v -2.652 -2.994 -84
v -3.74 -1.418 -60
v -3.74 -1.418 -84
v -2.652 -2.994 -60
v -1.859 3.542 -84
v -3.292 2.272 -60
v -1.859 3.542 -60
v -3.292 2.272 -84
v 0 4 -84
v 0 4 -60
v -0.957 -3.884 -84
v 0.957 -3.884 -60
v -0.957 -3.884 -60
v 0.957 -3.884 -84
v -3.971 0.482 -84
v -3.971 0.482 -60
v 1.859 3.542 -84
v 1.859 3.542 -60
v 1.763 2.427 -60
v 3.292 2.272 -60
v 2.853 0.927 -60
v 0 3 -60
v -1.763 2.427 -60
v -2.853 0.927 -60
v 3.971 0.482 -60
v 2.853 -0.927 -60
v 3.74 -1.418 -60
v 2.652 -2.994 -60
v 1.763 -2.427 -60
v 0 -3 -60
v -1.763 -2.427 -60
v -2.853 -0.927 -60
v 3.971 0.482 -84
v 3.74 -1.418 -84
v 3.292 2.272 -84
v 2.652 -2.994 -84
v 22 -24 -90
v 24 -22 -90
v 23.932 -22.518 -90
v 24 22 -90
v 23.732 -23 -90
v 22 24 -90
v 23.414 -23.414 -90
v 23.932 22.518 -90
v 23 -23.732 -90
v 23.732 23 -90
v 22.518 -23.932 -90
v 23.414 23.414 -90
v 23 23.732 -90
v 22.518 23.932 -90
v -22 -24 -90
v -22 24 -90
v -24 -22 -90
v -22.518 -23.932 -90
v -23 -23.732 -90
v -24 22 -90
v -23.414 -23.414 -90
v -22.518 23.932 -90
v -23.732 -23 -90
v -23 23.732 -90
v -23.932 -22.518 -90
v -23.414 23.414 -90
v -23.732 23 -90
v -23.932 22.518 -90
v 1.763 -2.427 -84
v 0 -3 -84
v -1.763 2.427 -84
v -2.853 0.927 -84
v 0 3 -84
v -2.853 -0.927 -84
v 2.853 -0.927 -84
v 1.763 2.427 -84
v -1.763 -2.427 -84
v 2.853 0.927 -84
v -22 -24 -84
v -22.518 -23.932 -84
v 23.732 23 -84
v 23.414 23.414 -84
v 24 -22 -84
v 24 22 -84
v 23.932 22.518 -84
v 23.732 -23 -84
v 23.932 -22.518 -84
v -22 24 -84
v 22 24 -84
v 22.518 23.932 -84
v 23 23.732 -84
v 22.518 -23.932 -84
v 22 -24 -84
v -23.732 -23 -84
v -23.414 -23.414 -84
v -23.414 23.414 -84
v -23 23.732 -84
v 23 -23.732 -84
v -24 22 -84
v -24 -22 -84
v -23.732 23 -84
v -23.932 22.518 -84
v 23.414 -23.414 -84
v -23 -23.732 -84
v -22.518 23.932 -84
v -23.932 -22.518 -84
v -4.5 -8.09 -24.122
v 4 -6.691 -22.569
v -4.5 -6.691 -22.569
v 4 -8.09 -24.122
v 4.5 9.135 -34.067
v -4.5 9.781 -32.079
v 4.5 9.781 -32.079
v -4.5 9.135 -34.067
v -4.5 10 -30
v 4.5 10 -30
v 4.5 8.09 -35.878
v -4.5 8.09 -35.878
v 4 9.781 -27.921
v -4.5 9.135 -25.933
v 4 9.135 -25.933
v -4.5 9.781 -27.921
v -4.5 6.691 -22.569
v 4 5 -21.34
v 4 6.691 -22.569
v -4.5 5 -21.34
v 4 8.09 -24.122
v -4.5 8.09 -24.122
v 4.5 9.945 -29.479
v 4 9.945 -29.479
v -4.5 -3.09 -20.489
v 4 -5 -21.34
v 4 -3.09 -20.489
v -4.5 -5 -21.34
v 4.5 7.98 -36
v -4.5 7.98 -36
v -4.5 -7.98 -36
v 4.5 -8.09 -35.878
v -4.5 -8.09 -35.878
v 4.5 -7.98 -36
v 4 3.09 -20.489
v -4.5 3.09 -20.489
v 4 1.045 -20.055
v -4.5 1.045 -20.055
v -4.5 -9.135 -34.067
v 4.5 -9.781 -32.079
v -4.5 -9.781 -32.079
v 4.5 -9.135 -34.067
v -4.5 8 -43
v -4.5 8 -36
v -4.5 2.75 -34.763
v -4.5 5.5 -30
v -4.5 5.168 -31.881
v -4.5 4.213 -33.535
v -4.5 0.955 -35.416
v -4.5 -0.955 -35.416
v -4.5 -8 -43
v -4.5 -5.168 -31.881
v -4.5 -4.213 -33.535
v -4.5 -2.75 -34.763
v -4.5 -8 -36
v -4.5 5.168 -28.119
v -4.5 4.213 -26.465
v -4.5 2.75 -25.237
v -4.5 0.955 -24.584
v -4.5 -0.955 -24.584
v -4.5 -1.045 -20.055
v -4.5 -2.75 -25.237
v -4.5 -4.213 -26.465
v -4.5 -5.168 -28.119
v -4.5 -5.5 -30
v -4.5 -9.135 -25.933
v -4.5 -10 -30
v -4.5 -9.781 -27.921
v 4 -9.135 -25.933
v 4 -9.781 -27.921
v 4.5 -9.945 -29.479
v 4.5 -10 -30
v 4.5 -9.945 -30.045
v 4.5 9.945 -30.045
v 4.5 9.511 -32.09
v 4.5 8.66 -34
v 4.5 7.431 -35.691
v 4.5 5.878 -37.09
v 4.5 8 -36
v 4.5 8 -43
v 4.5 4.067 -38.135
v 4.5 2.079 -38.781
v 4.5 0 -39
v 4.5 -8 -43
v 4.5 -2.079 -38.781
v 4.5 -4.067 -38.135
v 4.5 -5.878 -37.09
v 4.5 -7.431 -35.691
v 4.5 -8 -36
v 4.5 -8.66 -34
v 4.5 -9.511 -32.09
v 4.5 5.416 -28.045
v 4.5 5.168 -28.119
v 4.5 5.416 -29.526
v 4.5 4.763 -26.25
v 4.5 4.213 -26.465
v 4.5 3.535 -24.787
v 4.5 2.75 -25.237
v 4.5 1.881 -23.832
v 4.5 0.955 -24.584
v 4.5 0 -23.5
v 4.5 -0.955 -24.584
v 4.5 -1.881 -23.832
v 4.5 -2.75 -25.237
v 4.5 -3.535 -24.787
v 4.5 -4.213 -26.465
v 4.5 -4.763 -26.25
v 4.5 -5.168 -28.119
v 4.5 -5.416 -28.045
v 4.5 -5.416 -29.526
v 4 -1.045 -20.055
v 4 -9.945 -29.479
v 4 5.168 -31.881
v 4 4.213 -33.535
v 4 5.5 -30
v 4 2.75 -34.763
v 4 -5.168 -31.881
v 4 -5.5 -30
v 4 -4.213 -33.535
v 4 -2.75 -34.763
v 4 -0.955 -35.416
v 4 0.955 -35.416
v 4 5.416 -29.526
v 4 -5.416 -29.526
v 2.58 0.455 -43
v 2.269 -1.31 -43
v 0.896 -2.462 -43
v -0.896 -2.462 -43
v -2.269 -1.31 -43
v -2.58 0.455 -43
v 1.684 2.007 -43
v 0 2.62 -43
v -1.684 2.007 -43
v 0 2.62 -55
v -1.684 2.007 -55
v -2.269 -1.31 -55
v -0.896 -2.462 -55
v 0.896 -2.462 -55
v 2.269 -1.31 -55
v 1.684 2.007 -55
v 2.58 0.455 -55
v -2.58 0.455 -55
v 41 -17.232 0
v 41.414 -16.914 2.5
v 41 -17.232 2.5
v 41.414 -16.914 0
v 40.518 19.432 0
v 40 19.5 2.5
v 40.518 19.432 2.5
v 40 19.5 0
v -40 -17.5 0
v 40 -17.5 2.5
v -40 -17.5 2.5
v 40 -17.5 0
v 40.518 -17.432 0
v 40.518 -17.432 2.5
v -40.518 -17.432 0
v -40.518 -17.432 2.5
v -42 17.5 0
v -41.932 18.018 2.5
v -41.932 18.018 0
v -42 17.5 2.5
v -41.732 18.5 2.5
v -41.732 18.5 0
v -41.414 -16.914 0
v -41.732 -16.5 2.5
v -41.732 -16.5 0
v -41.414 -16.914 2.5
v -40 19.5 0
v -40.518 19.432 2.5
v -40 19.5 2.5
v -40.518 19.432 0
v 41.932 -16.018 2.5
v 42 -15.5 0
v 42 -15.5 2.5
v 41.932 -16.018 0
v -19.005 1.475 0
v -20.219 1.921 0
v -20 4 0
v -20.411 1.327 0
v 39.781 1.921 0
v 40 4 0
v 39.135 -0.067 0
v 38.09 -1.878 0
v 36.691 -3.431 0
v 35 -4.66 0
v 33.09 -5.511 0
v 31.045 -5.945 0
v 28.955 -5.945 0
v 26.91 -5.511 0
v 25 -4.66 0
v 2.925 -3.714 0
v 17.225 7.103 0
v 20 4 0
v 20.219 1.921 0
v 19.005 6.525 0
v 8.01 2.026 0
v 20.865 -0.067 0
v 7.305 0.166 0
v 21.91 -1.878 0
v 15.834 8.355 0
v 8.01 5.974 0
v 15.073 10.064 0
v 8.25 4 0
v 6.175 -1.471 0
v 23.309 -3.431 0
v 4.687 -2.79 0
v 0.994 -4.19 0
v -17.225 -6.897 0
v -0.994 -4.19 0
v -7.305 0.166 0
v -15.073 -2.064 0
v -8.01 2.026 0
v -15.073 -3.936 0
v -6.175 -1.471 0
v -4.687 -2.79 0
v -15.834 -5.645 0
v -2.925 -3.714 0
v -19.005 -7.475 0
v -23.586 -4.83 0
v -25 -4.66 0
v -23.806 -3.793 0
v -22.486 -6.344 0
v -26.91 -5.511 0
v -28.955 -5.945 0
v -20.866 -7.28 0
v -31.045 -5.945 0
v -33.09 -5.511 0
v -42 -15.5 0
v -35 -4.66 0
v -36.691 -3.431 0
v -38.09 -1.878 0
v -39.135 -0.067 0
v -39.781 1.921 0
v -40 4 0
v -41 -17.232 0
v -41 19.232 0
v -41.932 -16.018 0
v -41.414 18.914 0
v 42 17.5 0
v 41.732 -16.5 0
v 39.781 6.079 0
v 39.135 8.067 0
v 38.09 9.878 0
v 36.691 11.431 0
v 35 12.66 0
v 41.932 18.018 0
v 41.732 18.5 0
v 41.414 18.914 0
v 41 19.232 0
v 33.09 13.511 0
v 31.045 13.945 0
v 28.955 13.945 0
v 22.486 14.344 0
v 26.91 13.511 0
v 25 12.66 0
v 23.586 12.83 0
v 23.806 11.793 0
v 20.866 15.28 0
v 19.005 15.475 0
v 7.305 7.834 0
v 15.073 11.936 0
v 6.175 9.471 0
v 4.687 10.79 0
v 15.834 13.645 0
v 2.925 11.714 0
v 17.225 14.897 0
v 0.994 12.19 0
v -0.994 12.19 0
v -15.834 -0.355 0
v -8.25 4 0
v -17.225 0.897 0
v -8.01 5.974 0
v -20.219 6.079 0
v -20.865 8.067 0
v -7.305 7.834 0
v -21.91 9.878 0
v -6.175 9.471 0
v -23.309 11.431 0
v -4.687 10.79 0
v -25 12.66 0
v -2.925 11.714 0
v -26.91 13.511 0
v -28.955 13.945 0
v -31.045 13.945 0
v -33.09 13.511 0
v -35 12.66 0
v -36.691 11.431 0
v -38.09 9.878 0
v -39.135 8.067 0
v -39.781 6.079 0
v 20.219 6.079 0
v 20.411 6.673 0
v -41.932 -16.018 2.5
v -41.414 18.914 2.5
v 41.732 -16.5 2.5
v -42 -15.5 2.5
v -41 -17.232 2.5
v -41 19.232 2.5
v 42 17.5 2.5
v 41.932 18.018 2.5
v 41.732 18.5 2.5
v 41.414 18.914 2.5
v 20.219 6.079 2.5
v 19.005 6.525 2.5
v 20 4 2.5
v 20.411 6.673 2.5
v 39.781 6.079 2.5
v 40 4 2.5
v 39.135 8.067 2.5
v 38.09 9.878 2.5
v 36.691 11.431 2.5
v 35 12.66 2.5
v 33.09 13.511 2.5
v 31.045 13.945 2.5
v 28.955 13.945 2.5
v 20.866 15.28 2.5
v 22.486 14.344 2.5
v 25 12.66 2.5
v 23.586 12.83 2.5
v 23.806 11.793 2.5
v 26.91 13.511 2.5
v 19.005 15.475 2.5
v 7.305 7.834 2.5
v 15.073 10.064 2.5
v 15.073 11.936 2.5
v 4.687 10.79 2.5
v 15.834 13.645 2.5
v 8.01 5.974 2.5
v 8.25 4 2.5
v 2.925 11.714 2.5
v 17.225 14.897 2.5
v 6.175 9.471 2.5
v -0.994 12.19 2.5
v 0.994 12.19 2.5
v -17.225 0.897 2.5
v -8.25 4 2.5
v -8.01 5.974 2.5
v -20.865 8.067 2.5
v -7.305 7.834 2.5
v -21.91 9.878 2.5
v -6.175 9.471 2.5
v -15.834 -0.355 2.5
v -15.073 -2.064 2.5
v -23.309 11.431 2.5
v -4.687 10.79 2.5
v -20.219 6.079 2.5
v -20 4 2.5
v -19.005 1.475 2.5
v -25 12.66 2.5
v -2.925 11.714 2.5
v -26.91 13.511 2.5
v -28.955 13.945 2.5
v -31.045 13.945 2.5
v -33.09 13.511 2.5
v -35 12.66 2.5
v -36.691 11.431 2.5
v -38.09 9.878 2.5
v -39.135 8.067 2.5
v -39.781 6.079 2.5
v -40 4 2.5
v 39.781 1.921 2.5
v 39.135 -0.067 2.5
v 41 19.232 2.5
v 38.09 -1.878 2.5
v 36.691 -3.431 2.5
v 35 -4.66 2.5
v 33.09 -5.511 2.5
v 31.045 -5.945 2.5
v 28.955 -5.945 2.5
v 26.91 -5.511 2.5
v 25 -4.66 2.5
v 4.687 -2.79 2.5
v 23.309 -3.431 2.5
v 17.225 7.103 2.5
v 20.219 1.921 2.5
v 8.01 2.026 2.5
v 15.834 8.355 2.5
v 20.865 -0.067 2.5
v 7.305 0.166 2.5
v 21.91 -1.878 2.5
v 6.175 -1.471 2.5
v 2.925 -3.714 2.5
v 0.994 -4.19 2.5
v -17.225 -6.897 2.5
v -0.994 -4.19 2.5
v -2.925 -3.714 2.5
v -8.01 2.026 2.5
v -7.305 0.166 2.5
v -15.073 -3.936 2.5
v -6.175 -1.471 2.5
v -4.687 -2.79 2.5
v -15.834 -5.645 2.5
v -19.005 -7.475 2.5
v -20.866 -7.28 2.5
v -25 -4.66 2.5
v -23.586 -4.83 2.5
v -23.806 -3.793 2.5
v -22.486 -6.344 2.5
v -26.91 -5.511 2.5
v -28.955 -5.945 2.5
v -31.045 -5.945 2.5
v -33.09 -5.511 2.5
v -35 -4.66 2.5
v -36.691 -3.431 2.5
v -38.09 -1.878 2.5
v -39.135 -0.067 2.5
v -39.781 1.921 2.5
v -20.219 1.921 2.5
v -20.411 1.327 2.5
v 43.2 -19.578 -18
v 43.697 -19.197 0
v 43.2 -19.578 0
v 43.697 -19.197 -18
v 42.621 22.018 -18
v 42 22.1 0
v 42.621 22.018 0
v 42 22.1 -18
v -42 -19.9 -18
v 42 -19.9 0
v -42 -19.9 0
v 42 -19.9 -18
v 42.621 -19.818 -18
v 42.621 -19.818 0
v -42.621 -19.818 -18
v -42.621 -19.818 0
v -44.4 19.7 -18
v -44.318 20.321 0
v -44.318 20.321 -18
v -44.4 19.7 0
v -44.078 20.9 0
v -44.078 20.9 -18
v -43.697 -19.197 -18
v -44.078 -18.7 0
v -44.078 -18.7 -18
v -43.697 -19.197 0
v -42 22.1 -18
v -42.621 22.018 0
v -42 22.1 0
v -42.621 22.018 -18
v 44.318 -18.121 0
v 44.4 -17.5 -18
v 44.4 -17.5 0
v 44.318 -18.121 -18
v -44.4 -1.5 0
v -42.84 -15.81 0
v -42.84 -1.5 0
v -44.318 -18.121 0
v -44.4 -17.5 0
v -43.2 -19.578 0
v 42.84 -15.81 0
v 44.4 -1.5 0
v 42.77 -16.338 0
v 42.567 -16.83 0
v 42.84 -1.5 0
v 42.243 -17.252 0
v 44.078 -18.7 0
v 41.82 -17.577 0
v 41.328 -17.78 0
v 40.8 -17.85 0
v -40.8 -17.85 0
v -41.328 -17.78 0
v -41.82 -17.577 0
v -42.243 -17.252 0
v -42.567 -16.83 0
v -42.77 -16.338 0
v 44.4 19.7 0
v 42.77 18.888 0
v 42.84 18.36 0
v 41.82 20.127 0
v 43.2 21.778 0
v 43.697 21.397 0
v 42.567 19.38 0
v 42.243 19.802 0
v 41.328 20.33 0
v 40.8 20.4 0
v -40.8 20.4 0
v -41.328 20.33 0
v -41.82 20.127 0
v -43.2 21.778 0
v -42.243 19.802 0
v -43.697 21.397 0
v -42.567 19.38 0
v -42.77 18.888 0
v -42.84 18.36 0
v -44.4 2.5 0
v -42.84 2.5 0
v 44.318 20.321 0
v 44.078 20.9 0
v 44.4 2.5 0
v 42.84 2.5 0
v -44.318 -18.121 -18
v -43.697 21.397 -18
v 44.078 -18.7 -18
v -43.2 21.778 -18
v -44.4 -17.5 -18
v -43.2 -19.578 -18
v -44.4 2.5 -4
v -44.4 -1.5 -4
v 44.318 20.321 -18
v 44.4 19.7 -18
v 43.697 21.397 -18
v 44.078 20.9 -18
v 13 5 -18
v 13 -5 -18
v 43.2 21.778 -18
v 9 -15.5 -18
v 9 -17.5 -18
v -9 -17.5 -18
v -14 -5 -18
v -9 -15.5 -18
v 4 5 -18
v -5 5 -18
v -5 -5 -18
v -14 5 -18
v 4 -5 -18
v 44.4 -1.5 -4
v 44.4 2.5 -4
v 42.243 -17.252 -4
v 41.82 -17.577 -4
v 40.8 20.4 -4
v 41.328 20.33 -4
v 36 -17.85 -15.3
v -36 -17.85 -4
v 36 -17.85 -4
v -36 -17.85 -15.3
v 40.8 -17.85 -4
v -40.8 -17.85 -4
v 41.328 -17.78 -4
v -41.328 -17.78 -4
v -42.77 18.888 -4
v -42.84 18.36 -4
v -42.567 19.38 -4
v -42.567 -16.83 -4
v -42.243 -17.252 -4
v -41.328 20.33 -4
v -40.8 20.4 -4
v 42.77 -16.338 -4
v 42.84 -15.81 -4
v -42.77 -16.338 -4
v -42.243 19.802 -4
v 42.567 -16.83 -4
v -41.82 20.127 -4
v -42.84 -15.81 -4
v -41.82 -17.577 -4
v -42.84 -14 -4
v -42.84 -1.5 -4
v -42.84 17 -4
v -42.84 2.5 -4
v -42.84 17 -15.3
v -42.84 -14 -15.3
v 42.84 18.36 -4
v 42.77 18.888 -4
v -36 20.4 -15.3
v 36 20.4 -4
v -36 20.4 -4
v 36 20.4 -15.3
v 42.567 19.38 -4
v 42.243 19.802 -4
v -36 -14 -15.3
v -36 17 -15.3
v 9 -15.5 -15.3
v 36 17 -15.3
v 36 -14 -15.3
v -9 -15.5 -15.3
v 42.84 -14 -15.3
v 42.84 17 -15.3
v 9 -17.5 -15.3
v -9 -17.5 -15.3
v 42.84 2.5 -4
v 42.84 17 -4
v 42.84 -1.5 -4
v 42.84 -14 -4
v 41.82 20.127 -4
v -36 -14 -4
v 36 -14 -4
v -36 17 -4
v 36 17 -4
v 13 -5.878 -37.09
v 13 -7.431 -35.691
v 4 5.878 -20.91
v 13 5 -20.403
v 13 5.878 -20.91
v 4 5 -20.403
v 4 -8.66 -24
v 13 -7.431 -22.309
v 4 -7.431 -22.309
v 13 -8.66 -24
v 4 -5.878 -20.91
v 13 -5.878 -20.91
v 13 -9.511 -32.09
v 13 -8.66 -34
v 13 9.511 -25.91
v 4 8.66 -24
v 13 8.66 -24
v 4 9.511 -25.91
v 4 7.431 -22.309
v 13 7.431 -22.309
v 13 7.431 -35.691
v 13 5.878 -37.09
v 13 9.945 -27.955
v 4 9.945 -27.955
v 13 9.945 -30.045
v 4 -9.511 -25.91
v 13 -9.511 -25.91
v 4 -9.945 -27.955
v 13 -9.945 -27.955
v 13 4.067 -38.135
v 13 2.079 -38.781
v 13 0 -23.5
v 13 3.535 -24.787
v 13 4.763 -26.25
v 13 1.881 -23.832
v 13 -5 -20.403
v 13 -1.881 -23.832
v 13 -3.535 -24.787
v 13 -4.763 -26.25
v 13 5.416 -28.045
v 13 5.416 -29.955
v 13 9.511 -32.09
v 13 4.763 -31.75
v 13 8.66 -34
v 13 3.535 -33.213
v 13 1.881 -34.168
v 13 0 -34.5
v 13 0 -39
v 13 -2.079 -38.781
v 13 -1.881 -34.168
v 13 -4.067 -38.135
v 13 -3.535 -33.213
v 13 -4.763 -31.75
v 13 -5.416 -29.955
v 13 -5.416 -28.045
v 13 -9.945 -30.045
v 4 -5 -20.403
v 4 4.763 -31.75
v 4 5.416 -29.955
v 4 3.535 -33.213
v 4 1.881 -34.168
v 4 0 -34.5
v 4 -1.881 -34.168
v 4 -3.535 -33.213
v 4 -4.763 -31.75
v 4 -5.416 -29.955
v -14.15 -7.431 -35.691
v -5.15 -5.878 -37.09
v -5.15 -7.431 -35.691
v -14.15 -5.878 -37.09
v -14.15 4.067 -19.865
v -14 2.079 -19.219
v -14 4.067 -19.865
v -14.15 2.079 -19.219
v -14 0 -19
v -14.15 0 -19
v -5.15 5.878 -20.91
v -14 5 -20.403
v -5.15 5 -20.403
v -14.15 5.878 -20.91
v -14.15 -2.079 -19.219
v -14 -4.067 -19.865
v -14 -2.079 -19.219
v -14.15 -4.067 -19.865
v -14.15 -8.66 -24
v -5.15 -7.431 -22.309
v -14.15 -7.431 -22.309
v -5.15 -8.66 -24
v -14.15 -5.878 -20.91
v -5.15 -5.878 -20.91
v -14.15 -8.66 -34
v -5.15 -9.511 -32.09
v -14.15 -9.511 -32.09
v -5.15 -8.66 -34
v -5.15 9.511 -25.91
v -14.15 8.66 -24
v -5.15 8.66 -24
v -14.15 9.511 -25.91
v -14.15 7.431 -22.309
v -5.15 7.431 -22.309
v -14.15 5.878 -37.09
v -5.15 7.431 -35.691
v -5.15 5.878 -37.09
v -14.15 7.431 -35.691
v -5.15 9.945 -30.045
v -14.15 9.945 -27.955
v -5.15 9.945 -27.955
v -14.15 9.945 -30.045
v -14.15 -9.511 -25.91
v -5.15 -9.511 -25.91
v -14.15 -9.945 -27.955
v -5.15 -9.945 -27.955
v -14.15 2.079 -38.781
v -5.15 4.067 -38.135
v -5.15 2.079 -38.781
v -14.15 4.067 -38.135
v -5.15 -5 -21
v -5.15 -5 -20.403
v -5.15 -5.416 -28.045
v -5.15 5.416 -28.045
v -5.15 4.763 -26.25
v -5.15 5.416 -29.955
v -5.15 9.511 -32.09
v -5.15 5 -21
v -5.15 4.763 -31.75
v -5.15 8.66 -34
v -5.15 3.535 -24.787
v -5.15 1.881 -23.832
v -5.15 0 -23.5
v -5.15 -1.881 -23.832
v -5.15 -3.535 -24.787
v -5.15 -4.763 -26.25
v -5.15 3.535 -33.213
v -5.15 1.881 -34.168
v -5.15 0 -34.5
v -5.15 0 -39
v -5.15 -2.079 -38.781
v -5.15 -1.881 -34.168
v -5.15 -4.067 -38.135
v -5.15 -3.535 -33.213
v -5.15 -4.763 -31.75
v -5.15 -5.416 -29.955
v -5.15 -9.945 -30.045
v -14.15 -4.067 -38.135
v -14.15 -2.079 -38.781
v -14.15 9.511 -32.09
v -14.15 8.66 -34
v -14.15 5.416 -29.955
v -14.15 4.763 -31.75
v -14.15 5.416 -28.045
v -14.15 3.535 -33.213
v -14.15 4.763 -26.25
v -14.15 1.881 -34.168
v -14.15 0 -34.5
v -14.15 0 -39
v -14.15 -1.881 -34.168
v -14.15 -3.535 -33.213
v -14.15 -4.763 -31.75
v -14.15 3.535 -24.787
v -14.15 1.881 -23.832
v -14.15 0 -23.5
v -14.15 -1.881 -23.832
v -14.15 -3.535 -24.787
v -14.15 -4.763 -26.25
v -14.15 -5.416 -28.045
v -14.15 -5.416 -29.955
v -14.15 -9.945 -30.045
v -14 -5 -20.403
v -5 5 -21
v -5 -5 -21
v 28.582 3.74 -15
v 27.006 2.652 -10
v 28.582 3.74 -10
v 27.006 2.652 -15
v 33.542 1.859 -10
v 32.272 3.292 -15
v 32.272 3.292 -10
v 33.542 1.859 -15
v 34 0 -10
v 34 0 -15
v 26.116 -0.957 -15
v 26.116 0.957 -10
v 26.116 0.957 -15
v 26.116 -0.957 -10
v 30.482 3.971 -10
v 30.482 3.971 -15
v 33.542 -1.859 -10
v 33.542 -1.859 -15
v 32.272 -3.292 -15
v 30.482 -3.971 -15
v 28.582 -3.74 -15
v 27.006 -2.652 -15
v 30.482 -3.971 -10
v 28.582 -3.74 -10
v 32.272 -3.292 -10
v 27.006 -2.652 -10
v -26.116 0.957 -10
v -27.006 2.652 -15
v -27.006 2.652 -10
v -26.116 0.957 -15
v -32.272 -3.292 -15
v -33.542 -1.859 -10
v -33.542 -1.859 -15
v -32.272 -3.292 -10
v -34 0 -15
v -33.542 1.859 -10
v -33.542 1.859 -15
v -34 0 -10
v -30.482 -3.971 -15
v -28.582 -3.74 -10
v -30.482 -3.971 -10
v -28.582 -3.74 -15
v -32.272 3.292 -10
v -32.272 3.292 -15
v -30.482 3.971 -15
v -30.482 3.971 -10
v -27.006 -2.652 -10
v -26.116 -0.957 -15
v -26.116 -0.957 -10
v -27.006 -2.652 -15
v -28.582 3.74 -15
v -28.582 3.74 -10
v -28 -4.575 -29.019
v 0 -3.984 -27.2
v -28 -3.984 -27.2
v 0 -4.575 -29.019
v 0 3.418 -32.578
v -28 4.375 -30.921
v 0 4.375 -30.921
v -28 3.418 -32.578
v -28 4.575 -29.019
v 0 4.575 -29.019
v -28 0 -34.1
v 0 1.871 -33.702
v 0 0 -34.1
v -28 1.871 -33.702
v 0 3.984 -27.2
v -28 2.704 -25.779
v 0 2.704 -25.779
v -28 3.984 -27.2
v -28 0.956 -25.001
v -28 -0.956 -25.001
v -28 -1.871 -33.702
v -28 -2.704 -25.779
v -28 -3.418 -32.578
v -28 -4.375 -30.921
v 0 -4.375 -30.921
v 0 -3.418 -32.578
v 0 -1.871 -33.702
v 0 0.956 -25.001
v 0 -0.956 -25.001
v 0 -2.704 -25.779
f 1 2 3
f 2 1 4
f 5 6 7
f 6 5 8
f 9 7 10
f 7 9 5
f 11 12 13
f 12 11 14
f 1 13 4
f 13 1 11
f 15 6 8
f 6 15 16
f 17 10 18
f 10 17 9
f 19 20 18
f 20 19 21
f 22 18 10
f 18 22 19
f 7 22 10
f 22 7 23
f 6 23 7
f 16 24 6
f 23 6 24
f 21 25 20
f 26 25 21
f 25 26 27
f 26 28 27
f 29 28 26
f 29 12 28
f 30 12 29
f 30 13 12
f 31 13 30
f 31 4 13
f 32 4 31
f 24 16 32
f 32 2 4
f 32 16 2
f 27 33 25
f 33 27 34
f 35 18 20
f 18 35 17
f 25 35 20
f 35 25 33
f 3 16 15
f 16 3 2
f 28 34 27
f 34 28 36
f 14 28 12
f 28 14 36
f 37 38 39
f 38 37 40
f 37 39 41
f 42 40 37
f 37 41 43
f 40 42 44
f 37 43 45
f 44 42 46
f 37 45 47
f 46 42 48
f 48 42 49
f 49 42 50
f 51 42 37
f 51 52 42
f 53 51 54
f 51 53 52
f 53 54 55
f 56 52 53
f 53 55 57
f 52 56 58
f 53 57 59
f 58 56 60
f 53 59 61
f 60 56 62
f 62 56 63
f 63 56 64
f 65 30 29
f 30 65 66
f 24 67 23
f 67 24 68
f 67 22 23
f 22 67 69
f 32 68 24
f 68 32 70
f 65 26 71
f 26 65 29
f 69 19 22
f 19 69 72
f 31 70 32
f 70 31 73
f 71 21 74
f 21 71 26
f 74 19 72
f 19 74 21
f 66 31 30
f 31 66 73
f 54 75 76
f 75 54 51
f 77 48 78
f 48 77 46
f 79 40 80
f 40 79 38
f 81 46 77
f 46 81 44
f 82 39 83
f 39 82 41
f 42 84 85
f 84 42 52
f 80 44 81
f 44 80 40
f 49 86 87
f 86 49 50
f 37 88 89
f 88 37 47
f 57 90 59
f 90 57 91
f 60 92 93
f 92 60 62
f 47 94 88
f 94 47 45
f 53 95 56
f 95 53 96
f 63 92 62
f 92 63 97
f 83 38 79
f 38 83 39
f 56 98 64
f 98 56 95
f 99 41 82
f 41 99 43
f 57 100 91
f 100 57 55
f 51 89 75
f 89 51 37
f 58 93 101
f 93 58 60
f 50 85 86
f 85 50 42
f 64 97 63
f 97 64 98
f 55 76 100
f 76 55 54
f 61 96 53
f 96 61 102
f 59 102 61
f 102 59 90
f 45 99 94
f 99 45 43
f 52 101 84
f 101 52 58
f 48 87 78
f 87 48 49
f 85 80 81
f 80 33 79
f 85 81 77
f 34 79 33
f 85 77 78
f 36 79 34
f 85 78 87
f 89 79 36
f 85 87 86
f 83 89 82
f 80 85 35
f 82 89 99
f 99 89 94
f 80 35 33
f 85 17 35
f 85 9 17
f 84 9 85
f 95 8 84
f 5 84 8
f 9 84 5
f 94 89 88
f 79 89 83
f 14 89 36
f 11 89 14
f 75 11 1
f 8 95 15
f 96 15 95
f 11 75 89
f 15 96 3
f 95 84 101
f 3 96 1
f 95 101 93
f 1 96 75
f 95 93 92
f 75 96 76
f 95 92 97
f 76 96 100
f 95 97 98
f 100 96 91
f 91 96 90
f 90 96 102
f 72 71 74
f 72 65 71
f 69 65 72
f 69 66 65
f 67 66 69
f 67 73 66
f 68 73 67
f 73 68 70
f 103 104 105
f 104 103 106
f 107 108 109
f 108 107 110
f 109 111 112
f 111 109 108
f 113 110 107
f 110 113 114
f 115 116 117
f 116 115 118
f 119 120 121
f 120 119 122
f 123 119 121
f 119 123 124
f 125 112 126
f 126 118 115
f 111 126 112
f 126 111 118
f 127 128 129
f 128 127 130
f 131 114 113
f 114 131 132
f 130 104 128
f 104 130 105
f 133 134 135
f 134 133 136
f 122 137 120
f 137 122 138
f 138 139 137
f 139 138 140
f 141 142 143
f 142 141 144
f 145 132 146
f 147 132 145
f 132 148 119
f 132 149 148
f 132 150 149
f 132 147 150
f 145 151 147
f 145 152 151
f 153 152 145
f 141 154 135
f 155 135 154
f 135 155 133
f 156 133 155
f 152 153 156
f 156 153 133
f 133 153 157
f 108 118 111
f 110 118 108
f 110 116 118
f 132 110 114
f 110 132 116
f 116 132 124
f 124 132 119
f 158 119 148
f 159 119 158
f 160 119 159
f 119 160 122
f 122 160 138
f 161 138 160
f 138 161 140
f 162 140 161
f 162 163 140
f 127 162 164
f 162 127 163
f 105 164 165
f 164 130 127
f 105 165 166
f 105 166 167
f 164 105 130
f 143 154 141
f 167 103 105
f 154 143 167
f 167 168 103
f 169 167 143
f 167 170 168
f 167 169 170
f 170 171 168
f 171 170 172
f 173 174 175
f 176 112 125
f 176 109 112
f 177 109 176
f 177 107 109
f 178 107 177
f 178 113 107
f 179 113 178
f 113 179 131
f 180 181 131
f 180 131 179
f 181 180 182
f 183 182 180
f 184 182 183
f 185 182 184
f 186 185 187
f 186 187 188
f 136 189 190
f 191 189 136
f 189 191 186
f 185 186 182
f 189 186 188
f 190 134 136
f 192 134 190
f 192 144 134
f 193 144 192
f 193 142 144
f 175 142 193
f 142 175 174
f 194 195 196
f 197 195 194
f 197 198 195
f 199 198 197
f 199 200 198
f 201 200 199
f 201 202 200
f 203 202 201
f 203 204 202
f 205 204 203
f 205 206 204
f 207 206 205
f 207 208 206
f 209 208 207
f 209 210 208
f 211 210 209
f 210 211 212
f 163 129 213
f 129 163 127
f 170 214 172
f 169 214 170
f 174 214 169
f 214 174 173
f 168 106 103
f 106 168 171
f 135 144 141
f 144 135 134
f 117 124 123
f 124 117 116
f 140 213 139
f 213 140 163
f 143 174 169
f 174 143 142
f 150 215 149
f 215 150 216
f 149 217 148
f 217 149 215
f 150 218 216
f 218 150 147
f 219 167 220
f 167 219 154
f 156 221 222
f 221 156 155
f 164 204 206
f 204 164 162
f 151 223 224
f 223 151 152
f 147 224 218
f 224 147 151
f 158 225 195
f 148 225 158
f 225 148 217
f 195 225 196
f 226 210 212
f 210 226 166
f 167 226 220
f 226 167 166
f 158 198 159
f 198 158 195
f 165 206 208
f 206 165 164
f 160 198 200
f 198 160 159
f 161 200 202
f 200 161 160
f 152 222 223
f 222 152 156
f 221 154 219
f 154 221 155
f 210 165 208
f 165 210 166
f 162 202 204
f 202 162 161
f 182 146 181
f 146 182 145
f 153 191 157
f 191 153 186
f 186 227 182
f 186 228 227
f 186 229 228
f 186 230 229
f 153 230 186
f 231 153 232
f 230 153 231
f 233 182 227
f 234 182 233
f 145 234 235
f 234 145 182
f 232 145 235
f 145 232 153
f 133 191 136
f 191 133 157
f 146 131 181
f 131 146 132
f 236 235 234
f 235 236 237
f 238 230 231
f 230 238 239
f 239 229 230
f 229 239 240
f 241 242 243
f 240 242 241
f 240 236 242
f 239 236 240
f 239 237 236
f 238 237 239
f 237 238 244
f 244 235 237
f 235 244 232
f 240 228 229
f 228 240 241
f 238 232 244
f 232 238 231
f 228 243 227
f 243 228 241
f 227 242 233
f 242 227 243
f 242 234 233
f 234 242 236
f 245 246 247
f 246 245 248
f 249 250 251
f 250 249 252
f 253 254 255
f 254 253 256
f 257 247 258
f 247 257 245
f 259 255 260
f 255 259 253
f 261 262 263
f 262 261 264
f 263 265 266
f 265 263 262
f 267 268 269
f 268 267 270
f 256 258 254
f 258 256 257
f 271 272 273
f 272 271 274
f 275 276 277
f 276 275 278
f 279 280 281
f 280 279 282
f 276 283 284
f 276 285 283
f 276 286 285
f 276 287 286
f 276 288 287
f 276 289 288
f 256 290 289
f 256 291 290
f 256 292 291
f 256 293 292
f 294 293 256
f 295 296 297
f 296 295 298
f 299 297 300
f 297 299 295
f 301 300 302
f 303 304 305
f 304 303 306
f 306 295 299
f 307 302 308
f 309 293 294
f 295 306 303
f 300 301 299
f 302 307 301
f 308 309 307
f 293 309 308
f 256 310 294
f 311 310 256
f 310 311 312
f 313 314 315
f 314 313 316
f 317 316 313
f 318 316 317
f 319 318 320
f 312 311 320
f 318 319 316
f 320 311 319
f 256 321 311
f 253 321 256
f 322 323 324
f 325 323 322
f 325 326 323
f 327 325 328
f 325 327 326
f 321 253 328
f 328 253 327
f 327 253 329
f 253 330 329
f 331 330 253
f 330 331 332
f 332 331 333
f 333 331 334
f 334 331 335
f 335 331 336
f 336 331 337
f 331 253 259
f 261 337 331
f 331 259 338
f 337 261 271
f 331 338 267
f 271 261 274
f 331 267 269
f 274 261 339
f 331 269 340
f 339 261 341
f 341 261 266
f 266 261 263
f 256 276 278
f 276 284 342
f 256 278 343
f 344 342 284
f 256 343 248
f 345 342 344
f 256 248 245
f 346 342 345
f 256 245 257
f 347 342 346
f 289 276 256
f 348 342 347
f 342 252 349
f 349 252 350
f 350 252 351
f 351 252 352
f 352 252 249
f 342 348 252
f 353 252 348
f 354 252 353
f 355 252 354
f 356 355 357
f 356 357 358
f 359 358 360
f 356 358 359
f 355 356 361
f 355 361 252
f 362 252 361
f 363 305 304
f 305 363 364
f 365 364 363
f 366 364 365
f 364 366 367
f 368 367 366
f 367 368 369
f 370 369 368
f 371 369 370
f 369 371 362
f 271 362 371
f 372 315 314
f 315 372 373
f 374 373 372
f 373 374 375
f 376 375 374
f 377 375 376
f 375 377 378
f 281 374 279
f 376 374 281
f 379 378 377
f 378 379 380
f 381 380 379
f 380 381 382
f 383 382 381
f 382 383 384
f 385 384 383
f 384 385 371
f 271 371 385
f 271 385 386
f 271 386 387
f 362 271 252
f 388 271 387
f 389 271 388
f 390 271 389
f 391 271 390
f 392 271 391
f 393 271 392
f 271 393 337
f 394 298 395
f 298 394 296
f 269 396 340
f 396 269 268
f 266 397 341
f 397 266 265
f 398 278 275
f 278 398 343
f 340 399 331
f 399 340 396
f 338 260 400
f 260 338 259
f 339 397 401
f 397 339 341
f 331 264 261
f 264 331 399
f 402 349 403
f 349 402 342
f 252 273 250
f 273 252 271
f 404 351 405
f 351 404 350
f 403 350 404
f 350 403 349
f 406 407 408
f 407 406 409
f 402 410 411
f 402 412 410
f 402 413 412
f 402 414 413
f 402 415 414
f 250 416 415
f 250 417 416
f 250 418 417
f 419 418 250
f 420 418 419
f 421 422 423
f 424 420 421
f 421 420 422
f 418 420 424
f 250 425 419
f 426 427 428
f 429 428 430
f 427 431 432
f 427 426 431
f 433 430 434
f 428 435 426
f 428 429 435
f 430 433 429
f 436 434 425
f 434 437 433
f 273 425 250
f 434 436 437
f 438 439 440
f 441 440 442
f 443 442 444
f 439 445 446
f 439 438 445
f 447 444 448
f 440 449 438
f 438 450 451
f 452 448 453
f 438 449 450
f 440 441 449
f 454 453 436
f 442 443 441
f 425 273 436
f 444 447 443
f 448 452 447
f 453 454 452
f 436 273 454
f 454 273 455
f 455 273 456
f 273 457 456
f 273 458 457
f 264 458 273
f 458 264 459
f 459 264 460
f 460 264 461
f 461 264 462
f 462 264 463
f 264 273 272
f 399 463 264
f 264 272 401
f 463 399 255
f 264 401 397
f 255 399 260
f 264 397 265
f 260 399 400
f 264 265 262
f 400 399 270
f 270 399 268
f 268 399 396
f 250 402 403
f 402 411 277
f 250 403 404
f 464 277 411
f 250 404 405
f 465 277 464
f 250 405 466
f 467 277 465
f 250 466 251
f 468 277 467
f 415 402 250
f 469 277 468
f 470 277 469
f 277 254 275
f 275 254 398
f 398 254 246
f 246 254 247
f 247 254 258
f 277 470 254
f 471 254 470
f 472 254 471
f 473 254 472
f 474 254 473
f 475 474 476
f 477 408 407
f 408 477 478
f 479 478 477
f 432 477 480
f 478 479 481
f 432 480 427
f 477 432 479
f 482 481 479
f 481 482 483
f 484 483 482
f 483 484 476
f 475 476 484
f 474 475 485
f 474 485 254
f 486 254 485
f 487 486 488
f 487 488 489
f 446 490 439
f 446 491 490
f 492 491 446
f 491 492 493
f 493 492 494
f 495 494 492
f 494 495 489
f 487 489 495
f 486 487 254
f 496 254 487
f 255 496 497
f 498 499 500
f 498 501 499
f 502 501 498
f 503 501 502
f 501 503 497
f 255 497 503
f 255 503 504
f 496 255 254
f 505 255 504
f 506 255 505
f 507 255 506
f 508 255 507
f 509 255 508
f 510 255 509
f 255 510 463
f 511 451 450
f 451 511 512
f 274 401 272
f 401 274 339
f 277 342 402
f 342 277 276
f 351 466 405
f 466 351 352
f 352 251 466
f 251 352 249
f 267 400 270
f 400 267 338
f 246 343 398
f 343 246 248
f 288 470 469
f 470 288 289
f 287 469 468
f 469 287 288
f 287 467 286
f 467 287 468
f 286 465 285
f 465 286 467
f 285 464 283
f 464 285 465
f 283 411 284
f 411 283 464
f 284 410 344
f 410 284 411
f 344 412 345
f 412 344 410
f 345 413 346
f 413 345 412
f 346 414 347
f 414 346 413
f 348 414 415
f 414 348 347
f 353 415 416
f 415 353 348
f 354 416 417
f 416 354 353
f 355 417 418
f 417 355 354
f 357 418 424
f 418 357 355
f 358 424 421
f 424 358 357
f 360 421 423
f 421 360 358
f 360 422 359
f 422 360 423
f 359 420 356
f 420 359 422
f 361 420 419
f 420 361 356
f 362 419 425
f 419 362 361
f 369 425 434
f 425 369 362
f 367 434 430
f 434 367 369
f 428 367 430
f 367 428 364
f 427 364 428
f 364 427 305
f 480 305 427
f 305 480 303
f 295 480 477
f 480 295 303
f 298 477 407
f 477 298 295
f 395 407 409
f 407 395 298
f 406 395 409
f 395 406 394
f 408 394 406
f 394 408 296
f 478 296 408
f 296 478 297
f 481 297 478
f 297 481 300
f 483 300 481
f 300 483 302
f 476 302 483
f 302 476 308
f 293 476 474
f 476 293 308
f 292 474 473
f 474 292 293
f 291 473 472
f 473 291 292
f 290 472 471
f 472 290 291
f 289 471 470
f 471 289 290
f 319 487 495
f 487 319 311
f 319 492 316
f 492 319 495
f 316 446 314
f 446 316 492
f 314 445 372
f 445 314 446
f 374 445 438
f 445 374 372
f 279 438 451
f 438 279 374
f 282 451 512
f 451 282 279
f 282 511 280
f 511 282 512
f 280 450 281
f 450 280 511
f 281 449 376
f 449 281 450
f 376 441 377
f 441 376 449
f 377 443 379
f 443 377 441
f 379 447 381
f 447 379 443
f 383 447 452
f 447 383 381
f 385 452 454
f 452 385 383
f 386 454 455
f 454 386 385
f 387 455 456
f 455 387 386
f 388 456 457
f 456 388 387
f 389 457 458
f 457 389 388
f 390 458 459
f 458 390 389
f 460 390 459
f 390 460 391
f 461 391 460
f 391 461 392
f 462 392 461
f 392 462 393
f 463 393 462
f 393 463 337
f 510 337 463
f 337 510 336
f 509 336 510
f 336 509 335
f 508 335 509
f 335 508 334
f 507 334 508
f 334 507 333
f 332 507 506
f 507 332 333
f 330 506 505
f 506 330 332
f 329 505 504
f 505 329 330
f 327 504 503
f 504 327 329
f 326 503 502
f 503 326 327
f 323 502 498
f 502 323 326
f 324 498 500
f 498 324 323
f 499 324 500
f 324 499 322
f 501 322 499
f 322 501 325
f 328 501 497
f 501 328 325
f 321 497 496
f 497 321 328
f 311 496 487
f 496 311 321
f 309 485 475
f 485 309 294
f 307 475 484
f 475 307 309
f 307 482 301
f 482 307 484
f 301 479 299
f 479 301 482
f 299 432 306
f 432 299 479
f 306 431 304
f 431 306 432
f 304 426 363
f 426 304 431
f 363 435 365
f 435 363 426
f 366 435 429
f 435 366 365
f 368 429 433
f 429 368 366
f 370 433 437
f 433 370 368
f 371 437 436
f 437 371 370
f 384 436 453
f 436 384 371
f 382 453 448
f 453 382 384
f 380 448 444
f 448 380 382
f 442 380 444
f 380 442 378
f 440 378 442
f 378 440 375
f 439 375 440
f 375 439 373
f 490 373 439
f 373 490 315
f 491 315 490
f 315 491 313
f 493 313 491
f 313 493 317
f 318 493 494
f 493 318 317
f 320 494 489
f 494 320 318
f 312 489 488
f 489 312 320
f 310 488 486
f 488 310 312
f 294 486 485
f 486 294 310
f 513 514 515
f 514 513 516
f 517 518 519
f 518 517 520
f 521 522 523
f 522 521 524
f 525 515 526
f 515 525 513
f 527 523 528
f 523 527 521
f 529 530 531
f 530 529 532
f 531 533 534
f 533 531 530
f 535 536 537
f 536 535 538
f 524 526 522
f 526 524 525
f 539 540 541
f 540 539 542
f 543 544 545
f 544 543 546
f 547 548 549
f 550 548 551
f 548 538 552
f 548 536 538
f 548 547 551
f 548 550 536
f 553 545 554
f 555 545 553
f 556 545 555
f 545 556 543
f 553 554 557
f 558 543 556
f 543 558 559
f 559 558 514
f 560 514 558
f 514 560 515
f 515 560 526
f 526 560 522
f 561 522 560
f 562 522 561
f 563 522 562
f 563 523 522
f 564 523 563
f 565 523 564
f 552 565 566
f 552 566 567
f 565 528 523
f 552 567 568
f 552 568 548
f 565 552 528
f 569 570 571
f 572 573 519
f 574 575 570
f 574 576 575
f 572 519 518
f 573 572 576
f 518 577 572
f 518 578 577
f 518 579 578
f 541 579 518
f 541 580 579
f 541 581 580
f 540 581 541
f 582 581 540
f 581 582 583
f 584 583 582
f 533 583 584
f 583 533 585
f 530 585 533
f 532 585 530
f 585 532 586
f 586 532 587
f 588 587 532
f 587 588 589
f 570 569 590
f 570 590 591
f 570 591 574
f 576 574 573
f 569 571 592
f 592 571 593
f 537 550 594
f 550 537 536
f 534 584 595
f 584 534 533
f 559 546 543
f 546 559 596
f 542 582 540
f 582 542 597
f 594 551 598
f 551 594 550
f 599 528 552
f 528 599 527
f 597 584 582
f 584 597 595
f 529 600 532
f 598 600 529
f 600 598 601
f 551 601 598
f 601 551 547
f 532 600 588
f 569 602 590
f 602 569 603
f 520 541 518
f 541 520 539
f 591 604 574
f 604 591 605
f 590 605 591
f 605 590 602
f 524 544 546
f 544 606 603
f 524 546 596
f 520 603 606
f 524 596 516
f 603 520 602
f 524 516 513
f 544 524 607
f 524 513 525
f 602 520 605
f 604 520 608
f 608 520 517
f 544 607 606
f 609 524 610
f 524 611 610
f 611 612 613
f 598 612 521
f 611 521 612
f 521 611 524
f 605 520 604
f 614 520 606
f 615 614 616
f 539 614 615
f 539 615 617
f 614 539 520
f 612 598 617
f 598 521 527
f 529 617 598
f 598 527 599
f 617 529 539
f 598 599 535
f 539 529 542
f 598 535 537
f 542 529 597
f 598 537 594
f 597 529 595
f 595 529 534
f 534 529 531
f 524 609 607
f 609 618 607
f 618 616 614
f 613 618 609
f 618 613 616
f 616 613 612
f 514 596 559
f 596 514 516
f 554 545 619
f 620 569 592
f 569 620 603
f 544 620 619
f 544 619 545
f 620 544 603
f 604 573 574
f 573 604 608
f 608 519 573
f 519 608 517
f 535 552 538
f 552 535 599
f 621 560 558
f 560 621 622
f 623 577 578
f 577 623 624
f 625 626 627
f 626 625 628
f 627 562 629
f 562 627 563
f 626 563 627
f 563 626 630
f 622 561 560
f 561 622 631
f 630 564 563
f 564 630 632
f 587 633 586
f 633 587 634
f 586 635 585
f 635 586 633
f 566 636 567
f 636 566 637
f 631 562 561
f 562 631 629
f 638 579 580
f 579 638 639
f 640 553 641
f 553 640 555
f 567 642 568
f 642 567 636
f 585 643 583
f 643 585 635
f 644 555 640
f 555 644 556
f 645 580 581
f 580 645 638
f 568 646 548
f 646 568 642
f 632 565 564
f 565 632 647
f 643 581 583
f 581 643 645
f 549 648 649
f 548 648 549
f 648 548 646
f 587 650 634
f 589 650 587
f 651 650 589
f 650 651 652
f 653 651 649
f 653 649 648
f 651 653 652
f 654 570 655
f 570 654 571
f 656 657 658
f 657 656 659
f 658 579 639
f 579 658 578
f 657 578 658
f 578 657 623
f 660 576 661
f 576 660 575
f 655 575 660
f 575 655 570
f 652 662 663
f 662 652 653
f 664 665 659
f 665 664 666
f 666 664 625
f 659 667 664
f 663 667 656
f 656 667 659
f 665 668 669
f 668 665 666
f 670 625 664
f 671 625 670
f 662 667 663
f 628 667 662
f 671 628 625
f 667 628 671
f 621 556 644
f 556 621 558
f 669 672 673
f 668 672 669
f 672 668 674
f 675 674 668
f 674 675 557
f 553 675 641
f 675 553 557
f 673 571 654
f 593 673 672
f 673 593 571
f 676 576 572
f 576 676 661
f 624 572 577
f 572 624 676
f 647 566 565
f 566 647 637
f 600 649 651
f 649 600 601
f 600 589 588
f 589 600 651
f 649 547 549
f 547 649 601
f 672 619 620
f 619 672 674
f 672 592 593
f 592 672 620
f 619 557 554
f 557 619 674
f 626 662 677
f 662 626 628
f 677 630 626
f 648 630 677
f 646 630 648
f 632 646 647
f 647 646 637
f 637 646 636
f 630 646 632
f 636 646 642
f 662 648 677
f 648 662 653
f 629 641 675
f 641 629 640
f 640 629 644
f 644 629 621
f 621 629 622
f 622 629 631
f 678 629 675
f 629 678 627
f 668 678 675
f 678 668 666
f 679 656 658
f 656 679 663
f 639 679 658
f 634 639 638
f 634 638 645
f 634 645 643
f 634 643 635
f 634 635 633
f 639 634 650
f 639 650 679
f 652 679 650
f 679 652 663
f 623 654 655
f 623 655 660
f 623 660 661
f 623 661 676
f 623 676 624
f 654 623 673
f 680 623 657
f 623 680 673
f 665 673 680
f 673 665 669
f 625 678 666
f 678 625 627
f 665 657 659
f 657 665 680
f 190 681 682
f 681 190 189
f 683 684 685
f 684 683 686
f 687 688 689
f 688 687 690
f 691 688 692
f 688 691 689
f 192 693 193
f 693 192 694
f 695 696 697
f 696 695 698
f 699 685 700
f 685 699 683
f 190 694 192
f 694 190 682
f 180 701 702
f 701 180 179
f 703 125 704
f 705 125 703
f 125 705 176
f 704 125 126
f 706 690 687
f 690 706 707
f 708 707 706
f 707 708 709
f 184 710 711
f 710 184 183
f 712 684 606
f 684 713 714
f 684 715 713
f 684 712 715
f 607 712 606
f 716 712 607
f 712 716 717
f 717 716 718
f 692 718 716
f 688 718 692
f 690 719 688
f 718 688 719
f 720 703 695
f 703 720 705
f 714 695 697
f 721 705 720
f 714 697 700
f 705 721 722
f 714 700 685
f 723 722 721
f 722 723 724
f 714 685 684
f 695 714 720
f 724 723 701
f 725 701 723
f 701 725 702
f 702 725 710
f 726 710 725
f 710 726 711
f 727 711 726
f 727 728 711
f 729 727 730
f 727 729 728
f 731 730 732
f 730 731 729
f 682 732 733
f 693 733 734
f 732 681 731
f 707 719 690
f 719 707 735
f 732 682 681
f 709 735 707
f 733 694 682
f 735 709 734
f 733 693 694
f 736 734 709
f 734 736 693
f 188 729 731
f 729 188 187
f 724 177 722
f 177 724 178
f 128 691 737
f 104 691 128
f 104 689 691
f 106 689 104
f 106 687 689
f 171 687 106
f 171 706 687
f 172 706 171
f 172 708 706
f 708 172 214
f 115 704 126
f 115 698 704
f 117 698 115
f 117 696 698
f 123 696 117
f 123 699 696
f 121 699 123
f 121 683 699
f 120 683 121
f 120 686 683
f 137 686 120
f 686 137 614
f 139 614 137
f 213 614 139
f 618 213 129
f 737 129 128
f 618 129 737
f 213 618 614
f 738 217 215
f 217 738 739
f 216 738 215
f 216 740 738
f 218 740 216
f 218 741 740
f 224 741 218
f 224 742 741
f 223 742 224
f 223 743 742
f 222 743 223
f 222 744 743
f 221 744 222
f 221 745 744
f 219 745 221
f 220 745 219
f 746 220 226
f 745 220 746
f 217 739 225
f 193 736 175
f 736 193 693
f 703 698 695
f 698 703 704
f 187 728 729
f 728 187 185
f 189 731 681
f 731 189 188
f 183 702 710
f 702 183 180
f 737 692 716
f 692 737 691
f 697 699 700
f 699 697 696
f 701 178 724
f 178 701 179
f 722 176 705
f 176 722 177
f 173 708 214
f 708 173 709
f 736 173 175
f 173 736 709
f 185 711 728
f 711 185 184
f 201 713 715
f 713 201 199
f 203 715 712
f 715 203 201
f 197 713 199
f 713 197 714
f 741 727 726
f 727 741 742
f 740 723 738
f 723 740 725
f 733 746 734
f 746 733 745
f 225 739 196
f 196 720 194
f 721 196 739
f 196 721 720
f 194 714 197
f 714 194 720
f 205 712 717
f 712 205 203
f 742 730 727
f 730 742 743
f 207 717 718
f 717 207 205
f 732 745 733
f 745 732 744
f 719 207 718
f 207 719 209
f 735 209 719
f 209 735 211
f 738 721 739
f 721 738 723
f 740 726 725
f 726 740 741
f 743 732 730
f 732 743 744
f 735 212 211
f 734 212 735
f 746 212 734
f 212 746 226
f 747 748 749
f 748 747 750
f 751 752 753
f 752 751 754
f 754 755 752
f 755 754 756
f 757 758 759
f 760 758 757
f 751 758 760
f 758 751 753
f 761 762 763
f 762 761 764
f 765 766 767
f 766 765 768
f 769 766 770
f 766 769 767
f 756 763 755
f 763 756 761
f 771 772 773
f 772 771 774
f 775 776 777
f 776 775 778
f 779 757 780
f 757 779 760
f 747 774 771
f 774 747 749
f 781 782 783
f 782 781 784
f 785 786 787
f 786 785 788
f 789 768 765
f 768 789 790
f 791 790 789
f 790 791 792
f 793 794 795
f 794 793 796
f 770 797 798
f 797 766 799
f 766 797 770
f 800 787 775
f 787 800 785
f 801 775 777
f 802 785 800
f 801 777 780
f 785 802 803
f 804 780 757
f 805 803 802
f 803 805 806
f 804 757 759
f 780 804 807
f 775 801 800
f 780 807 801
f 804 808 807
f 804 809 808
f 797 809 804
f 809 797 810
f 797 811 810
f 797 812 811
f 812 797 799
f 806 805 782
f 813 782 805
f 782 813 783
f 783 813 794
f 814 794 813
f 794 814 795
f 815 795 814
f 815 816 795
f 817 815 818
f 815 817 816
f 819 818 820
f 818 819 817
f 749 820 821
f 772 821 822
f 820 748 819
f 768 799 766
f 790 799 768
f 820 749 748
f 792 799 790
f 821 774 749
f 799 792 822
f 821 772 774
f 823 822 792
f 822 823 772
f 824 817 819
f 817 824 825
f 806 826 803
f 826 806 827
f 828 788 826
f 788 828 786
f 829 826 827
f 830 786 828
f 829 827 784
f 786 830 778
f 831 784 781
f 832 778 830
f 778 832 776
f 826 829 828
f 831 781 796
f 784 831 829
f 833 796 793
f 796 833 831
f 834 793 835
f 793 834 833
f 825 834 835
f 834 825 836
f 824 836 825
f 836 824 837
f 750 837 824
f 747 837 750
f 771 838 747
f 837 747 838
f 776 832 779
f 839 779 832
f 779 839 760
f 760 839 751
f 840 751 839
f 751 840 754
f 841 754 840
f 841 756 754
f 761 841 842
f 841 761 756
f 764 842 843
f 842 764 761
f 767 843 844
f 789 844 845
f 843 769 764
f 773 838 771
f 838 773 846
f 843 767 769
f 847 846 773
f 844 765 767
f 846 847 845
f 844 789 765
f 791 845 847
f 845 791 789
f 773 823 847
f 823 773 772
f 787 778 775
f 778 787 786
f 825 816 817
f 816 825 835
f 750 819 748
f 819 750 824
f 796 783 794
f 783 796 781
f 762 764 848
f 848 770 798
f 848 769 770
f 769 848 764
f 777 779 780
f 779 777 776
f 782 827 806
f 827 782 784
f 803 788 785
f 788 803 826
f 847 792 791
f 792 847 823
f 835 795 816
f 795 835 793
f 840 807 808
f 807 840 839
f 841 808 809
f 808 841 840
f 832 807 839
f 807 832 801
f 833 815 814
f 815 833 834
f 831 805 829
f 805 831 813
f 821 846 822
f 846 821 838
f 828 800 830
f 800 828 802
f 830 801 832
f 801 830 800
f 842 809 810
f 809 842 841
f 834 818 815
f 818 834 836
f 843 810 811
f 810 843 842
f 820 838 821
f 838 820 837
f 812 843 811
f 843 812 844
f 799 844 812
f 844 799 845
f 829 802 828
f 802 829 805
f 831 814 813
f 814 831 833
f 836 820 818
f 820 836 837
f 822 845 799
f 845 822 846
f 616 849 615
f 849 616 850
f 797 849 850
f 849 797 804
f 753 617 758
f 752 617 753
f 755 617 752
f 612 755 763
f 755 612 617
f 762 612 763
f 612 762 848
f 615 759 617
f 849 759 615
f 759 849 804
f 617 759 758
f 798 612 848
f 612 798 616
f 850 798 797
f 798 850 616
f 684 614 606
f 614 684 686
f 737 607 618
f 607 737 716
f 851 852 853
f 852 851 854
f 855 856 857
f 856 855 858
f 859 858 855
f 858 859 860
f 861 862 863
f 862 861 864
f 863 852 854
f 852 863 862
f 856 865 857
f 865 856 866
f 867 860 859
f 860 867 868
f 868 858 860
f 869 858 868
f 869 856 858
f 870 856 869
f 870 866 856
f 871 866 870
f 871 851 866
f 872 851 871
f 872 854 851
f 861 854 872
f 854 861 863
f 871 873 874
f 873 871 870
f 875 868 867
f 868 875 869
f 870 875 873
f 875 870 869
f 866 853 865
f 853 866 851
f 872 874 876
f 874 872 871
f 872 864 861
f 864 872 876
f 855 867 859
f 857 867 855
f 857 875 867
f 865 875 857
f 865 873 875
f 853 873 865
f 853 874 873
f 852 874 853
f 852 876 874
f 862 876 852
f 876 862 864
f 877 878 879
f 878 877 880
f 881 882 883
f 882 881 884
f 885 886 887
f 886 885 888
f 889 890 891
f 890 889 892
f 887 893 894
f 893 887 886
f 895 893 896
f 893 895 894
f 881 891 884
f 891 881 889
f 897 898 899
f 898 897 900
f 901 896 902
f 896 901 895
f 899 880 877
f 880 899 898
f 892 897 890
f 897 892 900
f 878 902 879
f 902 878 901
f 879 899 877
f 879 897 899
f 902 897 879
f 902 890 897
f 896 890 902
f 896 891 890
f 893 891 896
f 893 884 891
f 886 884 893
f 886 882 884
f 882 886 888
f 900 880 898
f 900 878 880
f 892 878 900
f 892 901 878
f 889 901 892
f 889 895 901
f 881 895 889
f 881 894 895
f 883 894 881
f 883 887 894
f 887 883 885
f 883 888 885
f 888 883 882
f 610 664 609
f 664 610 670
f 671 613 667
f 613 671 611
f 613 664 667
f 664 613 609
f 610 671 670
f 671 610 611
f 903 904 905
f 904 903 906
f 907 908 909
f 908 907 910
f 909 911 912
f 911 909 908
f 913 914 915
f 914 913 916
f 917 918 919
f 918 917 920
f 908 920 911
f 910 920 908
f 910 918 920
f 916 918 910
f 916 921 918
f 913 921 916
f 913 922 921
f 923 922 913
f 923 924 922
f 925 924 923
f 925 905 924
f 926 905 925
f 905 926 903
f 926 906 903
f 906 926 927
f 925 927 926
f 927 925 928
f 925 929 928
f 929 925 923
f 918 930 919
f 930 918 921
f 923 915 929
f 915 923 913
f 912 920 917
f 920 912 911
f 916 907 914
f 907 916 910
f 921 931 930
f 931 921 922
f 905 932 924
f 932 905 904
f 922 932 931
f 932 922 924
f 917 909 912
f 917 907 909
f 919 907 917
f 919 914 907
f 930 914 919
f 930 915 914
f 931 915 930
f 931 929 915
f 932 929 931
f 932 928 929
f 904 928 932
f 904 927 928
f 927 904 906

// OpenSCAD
/*
    Modeling the raspeberry pi night vision camera
    By dotnetmobile@gmail.com December 2019 
*/

camera_diameter = 16.5;

big_circle_diameter = 20;
small_circle_diameter = 9;

big_circle_x_pos = 30;
big_circle_y_pos = 0;

//small_circle_x_pos = big_circle_x_pos - big_circle_diameter / 2;
small_circle_x_pos = 20.5;
small_circle_y_pos = 10;

camera_x_pos = 0;
camera_y_pos = 0;

// back side
backside_width = 80;
//backside_height = 25;
backside_height = 31;
backside_offset_x = -backside_width/2;
backside_offset_y = -backside_height/2;
//backside_offset_z = -18;
backside_offset_z = 0;

map_cube_x = 34;
map_cube_y = 8;
map_cube_z = 9;

irColor = "green";
cameraColor = "green";

backside_extrude_height = 15;

foot_big_disc_r = 10;
foot_big_disc_h = 3;

screw_hole_r = 5.5;

pivot_cylinder_h = 28;

foot_z_offset = 0;
foot_rotation_join_z_offset = 60;

foot_column_axis_h = 30;

module rotation_cylinder()
{
    difference()
    {
        cylinder(r=foot_big_disc_r,3*foot_big_disc_h);
        // screw hole
        translate([0,0,-2])
        cylinder(r=screw_hole_r,h=12);
    }
}

module pivot_cylinder()
{
    cylinder(r=screw_hole_r-.9,h=pivot_cylinder_h);
}

module roundedRectangle(width, height)  
{
    offset(2,$fn=24)
    square([width, height], center=false);
}

module irSensors()
{
    union()
    {
        // big circles
        translate([big_circle_x_pos,big_circle_y_pos,0])
        color(irColor)
        circle(d=big_circle_diameter);
        
        // small circles
        translate([0.95*small_circle_x_pos, 0.7*small_circle_y_pos, 0]) 
        color(irColor)
        circle(d=small_circle_diameter);
    }
}

module camera()
{
    translate([camera_x_pos, camera_y_pos, 0]) 
    color(cameraColor)
    circle(d=camera_diameter);
}

module night_vision_camera()
{
    irSensors();
    mirror([0,1,0]) mirror([1,0,0]) irSensors();
    camera();
}

module front_side_SAV()
{   
    difference() 
    {
        linear_extrude(height=2)
        translate([backside_offset_x, backside_offset_y, 1]) 
        roundedRectangle(backside_width, backside_height);
        
        linear_extrude(height=8) 
        night_vision_camera();
    }
}

module front_side()
{   
    difference() 
    {
        linear_extrude(height=2.5)
        translate([backside_offset_x, backside_offset_y, 1]) 
        roundedRectangle(backside_width, backside_height+2);
        
        translate([0,4,0])
        linear_extrude(height=8) 
        night_vision_camera();
    }
}

module twin_pillars()
{
    translate([backside_offset_x,backside_offset_y-4,4])
    cube([4,4,13]);
    translate([-backside_offset_x,backside_offset_y-4,4])
    cube([4,4,13]);
}

module front_side_blockers()
{
    twin_pillars();
    mirror([0,1,0])
    twin_pillars();
}

module back_rotation()
{
    translate([13,0,backside_height-2])
    {
        mirror([1,0,1])
        {
            translate([0,0,6.05*foot_big_disc_h])
            rotation_cylinder();
            rotation_cylinder();
        }
        translate([-27,-5,-13])
        cube([9,10,5]);
        translate([-9,-5,-13])
        cube([9,10,5]);
    }
}

module front_side_easy_extractors()
{
    translate([backside_offset_x-6,backside_offset_y+14,backside_offset_z])
    cube([5,4,4]);
    translate([-backside_offset_x,backside_offset_y+14,backside_offset_z])
    cube([5,4,4]);
}

module back_side()
{
    difference()
    {
        difference()
        {   
            // outside     
            translate([backside_offset_x-2,backside_offset_y-2,0])
            scale(1.2)
            color("blue")
            linear_extrude(height=backside_extrude_height)
            roundedRectangle(backside_width-10, backside_height);

            // inside
            scale(1.02)
            color("green")
            linear_extrude(height=backside_extrude_height)
            translate([backside_offset_x, backside_offset_y, 0])
            roundedRectangle(backside_width, backside_height+2.5);
        }
        front_side_easy_extractors();
    }
    // internal pilars for stopping front-side when clipsing it
    translate([0,1.5,0])
    union()
    {
        front_side_blockers();
        mirror([1,0,0]) front_side_blockers();
    }
    union()
    back_rotation(); 
}

module single_support()
{
    translate([big_circle_x_pos,big_circle_y_pos,backside_extrude_height-5])
    cylinder(5,r=4);
}

module camera_back_side_blockers()
{
    single_support();
    mirror([1,0,0]) single_support();
}

module extern_map_cube()
{
    translate([-map_cube_x/2-4,backside_offset_y*1.95,backside_offset_z+1]) 
    {
        color("red")
        scale(1.2)
        cube([map_cube_x,map_cube_y,map_cube_z+2]);
    }
}

module intern_map_cube()
{
        translate([-map_cube_x/2 -4 + 3.5,backside_offset_y*2.7,backside_offset_z+3]) 
        {
            cube([map_cube_x,map_cube_y*2.5,map_cube_z*0.7+2]);
        }
}

module case()
{
    difference()
    {
        translate([0,0,backside_offset_z]) union()
        {
            back_side();

            camera_back_side_blockers();
        }
        
        // map exit
        translate([-9, backside_offset_y-2, 15])
        cube([18,2,8]);
    }
}

module general_overview_front_side()
{
    front_side();
    backside_offset_z = -18;
    mirror([0,0,1])
    case();
}


// ------------------------------------------------

module foot()
{
    union()
    {
        // basis
        translate([-22,-22,foot_z_offset])
        linear_extrude(6)
        offset(2,$fn=24)
        square(44,44);
        // pilar
        difference() 
        {
            cylinder(r=4, h=foot_column_axis_h);
            cylinder(r=3, h=foot_column_axis_h);
        }
    }
}

module foot_rotation_join()
{
    union() 
    {
        rotation_cylinder();
        translate([-8,6,0])
        cube([16,7,3*foot_big_disc_h]);

        // extension axis
        translate([0,25,1.5*foot_big_disc_h])
        mirror([0,1,1])
        cylinder(r=2.62,h=15);
    }        
}

module general_overview_foot()
{
    // General overview of all elements
    foot();

    // rotation join
    translate([0,4.5,foot_rotation_join_z_offset])
    mirror([0,1,1])
    foot_rotation_join();
}


module main()
{
    translate([0,0,-90])
    rotate([0,0,90])
    general_overview_foot();

    general_overview_front_side();
    
    translate([-1*pivot_cylinder_h,0,-29.5])
    rotate([0,90,0])
    pivot_cylinder();
}

// The STL steps are used for generating each printing element
/* 
    STL step 1: foot generation

    foot();
*/    

/*
    STL step 2: rotation join

    foot_rotation_join();
*/

/*
    STL step 3: night vision case

    case();
*/

/*
    STL step 4: pivote cylinder

    pivot_cylinder();
*/

/*
    STL step 5: front side
*/
//    front_side();

main();
